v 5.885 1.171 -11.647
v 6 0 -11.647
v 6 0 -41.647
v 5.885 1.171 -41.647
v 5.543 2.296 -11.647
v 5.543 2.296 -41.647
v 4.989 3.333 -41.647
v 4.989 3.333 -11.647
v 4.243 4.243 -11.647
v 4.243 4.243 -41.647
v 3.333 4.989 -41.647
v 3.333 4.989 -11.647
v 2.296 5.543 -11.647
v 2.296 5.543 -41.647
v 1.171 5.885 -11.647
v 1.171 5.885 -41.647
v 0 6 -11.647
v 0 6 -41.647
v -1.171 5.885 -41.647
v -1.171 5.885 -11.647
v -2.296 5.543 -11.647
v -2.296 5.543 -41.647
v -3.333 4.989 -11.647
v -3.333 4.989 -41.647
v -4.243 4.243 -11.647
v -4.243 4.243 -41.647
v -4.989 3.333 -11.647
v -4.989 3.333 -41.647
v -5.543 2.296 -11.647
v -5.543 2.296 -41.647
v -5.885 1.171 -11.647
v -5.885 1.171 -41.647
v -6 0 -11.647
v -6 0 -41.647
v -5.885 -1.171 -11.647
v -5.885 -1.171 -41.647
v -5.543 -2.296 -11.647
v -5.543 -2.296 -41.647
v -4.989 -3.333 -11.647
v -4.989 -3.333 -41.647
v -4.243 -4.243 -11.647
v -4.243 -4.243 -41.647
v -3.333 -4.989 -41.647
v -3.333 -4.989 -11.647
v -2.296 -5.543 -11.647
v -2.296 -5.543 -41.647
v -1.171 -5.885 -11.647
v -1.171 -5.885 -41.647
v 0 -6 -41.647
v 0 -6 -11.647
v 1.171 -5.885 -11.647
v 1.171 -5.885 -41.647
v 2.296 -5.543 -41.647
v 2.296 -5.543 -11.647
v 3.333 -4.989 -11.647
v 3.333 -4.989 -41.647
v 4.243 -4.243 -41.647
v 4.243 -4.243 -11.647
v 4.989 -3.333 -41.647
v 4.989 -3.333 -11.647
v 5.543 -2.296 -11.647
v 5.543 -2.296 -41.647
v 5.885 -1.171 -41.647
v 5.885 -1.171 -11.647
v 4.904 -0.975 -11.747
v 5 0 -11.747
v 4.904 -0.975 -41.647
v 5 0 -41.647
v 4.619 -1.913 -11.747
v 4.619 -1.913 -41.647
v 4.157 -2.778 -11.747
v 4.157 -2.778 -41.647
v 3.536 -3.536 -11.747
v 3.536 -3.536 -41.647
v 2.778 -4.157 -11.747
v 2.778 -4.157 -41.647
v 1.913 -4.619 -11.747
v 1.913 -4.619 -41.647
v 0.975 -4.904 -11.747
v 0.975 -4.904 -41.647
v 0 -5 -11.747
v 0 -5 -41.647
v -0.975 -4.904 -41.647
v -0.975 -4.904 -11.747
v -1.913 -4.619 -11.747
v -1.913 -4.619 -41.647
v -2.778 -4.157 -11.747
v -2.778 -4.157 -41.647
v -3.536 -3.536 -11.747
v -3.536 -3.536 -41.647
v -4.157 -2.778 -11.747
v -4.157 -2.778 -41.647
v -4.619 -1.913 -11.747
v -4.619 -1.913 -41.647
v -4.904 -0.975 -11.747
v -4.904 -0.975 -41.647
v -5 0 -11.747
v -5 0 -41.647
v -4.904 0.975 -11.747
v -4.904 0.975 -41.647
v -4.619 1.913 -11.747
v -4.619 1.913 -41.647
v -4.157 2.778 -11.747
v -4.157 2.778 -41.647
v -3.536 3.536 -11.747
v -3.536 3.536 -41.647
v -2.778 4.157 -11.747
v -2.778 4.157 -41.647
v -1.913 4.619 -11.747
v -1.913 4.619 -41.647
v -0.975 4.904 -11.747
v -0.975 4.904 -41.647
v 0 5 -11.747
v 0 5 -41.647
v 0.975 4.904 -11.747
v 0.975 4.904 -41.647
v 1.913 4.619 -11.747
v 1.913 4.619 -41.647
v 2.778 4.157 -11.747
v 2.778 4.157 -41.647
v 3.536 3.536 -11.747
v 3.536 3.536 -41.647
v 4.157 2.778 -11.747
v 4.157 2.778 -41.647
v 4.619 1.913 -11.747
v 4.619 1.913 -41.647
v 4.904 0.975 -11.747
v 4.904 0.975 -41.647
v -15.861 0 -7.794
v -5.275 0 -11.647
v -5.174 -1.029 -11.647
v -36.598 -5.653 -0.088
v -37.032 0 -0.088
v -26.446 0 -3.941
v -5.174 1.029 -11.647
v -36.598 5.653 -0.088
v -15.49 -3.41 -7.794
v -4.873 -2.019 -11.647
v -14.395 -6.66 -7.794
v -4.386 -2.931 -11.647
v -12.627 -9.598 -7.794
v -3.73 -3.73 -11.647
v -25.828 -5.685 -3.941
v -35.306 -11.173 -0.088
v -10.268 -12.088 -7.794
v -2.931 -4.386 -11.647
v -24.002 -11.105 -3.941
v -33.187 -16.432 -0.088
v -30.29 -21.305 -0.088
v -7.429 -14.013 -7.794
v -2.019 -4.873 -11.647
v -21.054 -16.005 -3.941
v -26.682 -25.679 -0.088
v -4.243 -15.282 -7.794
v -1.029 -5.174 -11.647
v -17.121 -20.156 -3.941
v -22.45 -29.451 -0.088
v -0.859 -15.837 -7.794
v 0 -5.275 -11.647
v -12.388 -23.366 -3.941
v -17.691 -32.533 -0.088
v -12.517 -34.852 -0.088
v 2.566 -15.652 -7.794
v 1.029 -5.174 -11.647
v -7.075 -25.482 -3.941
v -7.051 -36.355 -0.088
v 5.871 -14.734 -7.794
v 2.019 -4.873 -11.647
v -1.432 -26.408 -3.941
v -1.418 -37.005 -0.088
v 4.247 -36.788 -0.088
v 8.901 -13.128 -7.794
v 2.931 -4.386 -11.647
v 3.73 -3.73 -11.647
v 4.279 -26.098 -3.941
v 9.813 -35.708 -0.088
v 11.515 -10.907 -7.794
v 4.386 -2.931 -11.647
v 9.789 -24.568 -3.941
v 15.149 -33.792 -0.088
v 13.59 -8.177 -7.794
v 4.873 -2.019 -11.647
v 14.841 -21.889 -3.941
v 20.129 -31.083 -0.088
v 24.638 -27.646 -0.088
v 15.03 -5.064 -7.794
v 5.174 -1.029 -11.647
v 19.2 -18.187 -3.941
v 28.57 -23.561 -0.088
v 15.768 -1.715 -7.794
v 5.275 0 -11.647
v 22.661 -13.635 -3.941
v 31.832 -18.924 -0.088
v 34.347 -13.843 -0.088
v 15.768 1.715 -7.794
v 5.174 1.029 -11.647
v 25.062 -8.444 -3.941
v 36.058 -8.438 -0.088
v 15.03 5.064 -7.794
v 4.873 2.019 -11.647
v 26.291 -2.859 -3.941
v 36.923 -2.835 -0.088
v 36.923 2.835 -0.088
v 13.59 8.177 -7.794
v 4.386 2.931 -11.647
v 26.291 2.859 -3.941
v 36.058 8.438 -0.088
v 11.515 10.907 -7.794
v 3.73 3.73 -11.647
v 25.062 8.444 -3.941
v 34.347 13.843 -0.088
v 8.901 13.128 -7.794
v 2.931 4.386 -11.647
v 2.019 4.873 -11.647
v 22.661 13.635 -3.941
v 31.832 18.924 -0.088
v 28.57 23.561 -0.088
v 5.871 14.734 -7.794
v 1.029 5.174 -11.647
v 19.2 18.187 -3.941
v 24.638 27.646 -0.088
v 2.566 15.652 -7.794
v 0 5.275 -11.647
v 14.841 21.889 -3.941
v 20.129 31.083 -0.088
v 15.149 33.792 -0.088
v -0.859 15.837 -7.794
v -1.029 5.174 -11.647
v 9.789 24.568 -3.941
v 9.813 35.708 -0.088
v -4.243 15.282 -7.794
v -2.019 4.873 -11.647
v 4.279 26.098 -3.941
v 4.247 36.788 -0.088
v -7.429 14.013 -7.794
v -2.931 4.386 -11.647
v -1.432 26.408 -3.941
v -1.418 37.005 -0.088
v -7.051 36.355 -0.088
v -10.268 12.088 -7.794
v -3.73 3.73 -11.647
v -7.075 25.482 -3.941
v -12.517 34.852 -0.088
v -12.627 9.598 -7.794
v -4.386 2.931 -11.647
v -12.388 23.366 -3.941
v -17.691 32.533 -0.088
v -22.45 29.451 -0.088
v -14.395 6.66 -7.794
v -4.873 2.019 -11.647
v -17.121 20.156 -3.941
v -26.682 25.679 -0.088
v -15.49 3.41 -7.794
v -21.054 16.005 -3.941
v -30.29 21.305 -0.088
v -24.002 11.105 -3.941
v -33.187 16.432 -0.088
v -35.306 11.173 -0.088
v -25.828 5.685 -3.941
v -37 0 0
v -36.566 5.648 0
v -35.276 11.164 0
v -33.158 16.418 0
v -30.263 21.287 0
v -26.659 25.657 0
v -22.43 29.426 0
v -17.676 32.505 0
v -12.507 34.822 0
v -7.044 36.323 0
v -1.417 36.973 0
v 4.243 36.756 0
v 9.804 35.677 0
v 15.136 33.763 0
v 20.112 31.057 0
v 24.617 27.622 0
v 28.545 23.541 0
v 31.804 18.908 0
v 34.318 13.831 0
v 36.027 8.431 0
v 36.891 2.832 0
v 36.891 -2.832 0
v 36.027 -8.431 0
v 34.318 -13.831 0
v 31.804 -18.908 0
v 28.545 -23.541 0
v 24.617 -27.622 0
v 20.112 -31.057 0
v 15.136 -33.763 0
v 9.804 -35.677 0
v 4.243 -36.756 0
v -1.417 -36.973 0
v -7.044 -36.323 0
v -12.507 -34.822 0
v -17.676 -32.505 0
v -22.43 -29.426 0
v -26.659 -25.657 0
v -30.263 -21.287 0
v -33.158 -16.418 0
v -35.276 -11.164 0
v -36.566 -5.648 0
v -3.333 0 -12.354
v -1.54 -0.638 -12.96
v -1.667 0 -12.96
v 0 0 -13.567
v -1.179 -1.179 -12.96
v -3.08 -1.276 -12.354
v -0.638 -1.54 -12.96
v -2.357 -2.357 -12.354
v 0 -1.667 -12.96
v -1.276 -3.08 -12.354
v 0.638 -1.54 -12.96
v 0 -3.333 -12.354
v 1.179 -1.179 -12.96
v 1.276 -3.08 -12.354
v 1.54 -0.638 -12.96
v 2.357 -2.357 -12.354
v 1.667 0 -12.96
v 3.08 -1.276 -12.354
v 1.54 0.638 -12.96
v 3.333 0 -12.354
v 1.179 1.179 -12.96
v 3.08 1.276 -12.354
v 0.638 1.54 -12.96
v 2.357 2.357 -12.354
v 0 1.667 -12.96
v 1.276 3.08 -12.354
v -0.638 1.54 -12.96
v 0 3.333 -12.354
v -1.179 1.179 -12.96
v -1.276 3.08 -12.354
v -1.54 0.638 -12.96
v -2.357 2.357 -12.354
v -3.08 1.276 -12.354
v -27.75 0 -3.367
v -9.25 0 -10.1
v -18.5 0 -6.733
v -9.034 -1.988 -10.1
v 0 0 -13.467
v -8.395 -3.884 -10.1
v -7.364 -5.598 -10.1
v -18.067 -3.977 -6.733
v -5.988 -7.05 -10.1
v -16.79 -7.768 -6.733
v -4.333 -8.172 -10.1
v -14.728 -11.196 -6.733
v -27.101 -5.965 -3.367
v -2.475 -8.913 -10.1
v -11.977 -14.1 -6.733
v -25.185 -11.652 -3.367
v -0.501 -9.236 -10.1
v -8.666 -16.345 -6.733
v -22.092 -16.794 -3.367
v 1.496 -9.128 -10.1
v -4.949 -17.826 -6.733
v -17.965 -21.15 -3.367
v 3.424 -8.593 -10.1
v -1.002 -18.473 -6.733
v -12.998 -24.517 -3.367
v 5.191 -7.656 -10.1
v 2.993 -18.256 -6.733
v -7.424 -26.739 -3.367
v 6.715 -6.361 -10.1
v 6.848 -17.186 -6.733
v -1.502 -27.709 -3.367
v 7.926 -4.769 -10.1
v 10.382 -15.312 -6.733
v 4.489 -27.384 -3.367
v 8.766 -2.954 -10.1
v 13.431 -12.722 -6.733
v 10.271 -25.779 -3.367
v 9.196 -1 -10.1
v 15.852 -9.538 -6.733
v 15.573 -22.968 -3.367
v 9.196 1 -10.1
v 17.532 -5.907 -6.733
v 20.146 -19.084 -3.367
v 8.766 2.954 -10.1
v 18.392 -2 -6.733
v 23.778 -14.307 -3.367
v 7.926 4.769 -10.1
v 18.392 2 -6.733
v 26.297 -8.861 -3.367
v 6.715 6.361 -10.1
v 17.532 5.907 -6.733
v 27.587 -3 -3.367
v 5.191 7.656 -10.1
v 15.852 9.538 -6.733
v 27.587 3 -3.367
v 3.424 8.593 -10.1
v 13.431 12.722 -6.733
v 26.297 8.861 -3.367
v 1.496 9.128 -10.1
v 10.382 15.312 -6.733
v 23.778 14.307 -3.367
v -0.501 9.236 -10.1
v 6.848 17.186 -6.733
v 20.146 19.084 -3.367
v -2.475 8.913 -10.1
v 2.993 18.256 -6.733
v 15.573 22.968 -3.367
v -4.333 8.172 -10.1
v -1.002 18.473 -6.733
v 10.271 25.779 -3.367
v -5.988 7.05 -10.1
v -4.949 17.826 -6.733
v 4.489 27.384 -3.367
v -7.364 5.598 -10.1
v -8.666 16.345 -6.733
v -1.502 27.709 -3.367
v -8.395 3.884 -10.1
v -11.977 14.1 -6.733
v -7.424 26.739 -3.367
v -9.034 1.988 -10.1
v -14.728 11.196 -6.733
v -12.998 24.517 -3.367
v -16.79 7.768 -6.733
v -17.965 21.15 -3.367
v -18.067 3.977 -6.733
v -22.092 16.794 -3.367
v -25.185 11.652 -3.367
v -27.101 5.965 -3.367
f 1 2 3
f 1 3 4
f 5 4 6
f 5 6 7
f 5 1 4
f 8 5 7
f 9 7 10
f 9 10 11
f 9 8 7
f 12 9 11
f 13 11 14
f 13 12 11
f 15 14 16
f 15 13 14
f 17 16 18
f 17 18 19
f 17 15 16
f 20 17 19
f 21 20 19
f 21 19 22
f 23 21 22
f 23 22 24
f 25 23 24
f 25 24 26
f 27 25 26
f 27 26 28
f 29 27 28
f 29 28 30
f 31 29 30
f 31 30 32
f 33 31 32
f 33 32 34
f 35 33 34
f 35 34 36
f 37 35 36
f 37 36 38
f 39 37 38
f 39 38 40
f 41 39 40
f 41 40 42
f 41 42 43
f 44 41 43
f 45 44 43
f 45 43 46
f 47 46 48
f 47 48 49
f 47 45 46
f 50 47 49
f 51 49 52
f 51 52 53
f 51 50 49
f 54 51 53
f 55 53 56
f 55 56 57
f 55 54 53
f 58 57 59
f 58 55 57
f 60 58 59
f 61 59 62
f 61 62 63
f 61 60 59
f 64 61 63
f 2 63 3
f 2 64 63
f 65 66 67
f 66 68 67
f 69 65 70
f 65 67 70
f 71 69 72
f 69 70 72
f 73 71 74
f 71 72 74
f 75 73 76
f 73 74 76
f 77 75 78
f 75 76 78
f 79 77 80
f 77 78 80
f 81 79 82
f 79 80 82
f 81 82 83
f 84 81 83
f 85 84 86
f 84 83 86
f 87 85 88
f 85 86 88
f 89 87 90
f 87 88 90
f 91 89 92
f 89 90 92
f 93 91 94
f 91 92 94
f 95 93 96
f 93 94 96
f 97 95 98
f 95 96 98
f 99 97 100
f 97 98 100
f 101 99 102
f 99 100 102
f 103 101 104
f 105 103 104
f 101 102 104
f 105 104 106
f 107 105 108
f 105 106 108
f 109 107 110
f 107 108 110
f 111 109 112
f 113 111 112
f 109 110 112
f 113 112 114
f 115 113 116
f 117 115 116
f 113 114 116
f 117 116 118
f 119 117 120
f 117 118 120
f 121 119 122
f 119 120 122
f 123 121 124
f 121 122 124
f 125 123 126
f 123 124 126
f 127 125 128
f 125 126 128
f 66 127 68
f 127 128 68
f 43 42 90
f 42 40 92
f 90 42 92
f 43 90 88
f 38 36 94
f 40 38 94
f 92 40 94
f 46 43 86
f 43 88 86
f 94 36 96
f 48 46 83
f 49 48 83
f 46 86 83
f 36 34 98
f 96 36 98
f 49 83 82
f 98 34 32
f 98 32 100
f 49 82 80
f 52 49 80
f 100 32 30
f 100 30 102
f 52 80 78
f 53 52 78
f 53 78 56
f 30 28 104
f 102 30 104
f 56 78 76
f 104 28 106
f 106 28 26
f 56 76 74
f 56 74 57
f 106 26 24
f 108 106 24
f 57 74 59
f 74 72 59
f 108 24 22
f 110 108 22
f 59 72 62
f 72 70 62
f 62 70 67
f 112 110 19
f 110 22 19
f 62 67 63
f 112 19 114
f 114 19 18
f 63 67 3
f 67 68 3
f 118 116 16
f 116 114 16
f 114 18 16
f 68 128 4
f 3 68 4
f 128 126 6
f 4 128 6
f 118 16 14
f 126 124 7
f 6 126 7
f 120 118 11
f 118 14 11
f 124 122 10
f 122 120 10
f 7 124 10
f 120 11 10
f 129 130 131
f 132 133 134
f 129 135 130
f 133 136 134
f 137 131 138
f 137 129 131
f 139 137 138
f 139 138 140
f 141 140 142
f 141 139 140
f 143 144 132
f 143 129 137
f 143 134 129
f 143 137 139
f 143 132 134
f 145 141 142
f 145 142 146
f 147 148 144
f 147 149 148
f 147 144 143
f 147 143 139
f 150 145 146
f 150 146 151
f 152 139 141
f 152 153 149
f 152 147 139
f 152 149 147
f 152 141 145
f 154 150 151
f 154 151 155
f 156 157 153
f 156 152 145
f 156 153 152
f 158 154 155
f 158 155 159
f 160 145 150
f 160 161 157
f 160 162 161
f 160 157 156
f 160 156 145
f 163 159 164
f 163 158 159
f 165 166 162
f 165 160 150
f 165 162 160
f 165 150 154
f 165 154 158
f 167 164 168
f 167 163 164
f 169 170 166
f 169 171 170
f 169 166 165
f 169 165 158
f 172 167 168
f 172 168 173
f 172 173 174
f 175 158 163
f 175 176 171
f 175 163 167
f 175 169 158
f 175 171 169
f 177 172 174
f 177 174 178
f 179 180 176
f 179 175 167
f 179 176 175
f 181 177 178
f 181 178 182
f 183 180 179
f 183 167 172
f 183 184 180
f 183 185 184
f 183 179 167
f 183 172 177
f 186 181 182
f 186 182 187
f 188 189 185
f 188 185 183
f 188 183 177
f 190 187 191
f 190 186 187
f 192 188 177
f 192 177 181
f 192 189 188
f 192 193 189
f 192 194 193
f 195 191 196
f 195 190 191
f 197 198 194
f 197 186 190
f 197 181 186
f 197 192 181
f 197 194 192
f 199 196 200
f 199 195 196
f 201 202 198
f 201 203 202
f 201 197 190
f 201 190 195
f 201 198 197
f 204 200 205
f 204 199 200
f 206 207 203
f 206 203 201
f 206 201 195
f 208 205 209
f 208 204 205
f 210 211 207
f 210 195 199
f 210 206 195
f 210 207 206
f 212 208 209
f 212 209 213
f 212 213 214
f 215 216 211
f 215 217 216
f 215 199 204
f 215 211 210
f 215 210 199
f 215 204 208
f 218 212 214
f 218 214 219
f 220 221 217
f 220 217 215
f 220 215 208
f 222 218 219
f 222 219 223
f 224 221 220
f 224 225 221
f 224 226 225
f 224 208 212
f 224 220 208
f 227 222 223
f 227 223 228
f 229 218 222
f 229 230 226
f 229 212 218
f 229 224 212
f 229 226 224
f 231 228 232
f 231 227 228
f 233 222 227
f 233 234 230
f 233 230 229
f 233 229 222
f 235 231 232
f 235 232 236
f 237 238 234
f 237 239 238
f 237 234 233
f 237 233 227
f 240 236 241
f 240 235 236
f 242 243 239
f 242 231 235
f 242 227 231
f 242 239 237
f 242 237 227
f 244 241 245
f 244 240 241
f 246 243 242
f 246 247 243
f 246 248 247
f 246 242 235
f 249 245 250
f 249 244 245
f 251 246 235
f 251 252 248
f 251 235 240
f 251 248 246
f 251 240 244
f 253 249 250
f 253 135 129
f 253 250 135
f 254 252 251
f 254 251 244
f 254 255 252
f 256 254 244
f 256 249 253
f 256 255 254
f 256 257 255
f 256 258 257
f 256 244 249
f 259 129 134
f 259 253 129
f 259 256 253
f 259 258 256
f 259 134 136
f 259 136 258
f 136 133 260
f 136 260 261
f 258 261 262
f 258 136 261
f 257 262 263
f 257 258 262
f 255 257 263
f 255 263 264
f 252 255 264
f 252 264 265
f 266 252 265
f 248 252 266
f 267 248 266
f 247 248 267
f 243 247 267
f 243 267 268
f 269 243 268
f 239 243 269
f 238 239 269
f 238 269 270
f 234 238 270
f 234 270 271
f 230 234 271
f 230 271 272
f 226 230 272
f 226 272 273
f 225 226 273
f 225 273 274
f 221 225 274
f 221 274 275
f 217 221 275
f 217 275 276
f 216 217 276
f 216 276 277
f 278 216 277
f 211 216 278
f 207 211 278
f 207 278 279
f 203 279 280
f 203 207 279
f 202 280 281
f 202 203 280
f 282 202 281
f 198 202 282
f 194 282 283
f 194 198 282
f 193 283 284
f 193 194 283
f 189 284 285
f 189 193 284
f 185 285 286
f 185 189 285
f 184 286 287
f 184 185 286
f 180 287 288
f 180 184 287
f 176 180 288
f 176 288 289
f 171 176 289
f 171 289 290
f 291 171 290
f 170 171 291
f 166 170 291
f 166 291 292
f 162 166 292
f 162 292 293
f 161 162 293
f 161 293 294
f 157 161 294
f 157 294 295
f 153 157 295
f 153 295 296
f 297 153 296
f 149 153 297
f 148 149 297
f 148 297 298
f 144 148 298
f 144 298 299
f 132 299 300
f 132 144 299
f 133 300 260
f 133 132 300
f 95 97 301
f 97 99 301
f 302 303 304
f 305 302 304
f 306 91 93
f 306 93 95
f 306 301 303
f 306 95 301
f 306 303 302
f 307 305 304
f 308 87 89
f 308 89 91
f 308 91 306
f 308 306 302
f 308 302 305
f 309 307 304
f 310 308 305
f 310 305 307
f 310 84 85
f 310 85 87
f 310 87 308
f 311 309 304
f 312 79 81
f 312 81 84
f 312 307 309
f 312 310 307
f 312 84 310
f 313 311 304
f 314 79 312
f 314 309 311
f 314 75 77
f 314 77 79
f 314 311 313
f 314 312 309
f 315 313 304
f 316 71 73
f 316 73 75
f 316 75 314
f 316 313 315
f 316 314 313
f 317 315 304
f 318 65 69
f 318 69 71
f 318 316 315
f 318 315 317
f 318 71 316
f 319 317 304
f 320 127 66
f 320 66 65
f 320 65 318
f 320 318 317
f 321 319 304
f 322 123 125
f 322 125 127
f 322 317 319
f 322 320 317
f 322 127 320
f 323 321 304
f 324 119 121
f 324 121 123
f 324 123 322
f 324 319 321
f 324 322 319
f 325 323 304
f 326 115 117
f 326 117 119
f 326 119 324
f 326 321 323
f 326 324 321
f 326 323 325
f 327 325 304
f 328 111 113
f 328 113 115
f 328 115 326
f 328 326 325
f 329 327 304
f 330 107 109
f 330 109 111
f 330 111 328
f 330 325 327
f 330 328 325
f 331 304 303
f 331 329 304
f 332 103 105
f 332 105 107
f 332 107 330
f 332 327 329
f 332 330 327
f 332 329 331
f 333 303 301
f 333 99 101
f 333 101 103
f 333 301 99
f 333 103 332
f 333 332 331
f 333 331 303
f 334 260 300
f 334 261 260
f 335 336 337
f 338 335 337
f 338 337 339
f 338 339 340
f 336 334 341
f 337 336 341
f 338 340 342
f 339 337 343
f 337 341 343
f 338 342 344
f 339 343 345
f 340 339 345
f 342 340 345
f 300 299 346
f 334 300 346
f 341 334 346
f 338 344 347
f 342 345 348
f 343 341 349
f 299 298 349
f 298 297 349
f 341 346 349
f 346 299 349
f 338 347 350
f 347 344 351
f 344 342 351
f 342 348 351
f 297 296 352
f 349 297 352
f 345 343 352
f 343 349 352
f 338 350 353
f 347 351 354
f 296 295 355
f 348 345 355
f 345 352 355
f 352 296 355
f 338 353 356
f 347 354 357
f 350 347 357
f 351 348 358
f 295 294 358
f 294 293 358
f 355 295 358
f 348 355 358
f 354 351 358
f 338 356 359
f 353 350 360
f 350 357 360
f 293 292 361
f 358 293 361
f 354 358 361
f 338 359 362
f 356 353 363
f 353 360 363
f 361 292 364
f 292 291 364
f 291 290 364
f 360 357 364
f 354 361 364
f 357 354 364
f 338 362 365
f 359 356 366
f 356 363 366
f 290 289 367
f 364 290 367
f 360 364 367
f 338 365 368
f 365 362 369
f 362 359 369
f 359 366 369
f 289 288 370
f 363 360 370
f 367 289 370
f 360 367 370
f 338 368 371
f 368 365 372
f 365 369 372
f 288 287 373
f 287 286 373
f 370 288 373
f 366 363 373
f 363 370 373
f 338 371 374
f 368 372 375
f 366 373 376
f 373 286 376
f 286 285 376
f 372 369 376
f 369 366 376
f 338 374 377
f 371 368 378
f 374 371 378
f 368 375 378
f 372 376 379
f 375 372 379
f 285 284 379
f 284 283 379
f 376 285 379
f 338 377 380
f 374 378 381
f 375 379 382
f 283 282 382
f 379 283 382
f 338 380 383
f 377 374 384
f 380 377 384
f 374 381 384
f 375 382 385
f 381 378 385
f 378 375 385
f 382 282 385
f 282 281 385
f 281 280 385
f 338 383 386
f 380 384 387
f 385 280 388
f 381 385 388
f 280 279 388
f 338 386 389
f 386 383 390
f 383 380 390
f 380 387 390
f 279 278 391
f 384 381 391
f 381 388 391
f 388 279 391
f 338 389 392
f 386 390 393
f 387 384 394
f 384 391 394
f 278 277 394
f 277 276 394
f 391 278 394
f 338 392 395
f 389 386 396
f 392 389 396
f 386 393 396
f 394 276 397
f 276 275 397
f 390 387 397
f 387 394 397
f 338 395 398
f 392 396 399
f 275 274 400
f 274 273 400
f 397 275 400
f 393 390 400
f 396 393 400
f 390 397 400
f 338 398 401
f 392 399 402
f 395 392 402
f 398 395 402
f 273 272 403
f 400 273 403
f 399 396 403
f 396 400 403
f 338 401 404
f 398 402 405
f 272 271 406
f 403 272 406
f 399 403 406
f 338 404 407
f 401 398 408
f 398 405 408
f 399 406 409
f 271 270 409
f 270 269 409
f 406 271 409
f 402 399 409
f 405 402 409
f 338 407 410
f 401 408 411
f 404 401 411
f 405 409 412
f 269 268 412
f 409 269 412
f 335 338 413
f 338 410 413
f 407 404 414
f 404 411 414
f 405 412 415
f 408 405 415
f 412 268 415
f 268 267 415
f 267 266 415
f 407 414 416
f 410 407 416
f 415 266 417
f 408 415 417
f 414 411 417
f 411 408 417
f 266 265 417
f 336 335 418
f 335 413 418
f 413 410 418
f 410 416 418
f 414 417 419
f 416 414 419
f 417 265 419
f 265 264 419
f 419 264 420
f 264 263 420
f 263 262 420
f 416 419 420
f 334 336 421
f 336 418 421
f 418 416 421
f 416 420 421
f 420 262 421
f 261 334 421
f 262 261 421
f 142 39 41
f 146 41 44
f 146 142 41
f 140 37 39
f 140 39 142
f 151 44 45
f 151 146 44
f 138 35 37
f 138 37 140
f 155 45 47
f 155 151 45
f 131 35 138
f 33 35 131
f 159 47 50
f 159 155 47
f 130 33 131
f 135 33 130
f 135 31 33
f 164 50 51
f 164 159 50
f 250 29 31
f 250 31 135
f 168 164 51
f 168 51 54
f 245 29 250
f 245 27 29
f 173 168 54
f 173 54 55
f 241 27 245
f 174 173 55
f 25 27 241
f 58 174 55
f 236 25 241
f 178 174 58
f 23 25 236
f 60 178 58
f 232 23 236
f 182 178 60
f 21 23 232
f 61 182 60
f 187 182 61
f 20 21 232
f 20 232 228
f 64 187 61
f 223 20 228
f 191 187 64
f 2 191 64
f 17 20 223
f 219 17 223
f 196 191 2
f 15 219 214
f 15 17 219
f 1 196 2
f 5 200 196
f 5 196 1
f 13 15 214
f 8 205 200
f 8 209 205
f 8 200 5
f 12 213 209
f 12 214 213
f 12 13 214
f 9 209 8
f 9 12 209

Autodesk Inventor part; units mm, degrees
ref_plane "YZ Plane" through (0, 0, 0) normal (1, 0, 0) x (0, 1, 0)
ref_plane "XZ Plane" through (0, 0, 0) normal (0, 1, 0) x (-1, 0, 0)
ref_plane "XY Plane" through (0, 0, 0) normal (0, 0, 1) x (1, 0, 0)
sketch "Sketch2" plane through (0, 0, 0) normal (0, 1, 0) x (-1, 0, 0)
  line L0 (37, 0) -> (0, -13.4669)
  line L1 (37, 0) -> (76.3746, 0) construction
  line L2 (0, -13.4669) -> (0, -13.5669)
  line L3 (0, -13.5669) -> (37.0321, -0.0883)
  line L4 (37.0321, -0.0883) -> (37, 0)
  line L5 (0, -16.2803) -> (0, 2.7134) projected
  point P0 (0, 0)
  dimension "d5" = 160
  dimension "d6" = 0.1
  dimension "d7" = 110
  dimension "d8" = 70
revolve "Revolution2" add sketch "Sketch2" angle 360 about axis through (0, 0, -10) along (0, 0, 1)
sketch "Sketch3" plane through (0, 0, 0) normal (0, 1, 0) x (-1, 0, 0)
  line L0 (-37, 0) -> (0, -13.4669) projected
  line L1 (-5, -11.647) -> (-5, -41.647)
  line L2 (-5, -41.647) -> (-6, -41.647)
  line L3 (-6, -41.647) -> (-6, -11.647)
  line L4 (-6, -11.647) -> (-5, -11.647)
  line L5 (0, -37.9765) -> (0, 6.3294) projected
  point P0 (0, 0)
  dimension "d10" = 30
  dimension "d11" = 1
  dimension "d12" = 90
  dimension "d13" = 30
  dimension "d14" = 90
revolve "Revolution3" add sketch "Sketch3" angle 360 about axis through (0, 0, -10) along (0, 0, 1)
properties part number "small_membrane"
